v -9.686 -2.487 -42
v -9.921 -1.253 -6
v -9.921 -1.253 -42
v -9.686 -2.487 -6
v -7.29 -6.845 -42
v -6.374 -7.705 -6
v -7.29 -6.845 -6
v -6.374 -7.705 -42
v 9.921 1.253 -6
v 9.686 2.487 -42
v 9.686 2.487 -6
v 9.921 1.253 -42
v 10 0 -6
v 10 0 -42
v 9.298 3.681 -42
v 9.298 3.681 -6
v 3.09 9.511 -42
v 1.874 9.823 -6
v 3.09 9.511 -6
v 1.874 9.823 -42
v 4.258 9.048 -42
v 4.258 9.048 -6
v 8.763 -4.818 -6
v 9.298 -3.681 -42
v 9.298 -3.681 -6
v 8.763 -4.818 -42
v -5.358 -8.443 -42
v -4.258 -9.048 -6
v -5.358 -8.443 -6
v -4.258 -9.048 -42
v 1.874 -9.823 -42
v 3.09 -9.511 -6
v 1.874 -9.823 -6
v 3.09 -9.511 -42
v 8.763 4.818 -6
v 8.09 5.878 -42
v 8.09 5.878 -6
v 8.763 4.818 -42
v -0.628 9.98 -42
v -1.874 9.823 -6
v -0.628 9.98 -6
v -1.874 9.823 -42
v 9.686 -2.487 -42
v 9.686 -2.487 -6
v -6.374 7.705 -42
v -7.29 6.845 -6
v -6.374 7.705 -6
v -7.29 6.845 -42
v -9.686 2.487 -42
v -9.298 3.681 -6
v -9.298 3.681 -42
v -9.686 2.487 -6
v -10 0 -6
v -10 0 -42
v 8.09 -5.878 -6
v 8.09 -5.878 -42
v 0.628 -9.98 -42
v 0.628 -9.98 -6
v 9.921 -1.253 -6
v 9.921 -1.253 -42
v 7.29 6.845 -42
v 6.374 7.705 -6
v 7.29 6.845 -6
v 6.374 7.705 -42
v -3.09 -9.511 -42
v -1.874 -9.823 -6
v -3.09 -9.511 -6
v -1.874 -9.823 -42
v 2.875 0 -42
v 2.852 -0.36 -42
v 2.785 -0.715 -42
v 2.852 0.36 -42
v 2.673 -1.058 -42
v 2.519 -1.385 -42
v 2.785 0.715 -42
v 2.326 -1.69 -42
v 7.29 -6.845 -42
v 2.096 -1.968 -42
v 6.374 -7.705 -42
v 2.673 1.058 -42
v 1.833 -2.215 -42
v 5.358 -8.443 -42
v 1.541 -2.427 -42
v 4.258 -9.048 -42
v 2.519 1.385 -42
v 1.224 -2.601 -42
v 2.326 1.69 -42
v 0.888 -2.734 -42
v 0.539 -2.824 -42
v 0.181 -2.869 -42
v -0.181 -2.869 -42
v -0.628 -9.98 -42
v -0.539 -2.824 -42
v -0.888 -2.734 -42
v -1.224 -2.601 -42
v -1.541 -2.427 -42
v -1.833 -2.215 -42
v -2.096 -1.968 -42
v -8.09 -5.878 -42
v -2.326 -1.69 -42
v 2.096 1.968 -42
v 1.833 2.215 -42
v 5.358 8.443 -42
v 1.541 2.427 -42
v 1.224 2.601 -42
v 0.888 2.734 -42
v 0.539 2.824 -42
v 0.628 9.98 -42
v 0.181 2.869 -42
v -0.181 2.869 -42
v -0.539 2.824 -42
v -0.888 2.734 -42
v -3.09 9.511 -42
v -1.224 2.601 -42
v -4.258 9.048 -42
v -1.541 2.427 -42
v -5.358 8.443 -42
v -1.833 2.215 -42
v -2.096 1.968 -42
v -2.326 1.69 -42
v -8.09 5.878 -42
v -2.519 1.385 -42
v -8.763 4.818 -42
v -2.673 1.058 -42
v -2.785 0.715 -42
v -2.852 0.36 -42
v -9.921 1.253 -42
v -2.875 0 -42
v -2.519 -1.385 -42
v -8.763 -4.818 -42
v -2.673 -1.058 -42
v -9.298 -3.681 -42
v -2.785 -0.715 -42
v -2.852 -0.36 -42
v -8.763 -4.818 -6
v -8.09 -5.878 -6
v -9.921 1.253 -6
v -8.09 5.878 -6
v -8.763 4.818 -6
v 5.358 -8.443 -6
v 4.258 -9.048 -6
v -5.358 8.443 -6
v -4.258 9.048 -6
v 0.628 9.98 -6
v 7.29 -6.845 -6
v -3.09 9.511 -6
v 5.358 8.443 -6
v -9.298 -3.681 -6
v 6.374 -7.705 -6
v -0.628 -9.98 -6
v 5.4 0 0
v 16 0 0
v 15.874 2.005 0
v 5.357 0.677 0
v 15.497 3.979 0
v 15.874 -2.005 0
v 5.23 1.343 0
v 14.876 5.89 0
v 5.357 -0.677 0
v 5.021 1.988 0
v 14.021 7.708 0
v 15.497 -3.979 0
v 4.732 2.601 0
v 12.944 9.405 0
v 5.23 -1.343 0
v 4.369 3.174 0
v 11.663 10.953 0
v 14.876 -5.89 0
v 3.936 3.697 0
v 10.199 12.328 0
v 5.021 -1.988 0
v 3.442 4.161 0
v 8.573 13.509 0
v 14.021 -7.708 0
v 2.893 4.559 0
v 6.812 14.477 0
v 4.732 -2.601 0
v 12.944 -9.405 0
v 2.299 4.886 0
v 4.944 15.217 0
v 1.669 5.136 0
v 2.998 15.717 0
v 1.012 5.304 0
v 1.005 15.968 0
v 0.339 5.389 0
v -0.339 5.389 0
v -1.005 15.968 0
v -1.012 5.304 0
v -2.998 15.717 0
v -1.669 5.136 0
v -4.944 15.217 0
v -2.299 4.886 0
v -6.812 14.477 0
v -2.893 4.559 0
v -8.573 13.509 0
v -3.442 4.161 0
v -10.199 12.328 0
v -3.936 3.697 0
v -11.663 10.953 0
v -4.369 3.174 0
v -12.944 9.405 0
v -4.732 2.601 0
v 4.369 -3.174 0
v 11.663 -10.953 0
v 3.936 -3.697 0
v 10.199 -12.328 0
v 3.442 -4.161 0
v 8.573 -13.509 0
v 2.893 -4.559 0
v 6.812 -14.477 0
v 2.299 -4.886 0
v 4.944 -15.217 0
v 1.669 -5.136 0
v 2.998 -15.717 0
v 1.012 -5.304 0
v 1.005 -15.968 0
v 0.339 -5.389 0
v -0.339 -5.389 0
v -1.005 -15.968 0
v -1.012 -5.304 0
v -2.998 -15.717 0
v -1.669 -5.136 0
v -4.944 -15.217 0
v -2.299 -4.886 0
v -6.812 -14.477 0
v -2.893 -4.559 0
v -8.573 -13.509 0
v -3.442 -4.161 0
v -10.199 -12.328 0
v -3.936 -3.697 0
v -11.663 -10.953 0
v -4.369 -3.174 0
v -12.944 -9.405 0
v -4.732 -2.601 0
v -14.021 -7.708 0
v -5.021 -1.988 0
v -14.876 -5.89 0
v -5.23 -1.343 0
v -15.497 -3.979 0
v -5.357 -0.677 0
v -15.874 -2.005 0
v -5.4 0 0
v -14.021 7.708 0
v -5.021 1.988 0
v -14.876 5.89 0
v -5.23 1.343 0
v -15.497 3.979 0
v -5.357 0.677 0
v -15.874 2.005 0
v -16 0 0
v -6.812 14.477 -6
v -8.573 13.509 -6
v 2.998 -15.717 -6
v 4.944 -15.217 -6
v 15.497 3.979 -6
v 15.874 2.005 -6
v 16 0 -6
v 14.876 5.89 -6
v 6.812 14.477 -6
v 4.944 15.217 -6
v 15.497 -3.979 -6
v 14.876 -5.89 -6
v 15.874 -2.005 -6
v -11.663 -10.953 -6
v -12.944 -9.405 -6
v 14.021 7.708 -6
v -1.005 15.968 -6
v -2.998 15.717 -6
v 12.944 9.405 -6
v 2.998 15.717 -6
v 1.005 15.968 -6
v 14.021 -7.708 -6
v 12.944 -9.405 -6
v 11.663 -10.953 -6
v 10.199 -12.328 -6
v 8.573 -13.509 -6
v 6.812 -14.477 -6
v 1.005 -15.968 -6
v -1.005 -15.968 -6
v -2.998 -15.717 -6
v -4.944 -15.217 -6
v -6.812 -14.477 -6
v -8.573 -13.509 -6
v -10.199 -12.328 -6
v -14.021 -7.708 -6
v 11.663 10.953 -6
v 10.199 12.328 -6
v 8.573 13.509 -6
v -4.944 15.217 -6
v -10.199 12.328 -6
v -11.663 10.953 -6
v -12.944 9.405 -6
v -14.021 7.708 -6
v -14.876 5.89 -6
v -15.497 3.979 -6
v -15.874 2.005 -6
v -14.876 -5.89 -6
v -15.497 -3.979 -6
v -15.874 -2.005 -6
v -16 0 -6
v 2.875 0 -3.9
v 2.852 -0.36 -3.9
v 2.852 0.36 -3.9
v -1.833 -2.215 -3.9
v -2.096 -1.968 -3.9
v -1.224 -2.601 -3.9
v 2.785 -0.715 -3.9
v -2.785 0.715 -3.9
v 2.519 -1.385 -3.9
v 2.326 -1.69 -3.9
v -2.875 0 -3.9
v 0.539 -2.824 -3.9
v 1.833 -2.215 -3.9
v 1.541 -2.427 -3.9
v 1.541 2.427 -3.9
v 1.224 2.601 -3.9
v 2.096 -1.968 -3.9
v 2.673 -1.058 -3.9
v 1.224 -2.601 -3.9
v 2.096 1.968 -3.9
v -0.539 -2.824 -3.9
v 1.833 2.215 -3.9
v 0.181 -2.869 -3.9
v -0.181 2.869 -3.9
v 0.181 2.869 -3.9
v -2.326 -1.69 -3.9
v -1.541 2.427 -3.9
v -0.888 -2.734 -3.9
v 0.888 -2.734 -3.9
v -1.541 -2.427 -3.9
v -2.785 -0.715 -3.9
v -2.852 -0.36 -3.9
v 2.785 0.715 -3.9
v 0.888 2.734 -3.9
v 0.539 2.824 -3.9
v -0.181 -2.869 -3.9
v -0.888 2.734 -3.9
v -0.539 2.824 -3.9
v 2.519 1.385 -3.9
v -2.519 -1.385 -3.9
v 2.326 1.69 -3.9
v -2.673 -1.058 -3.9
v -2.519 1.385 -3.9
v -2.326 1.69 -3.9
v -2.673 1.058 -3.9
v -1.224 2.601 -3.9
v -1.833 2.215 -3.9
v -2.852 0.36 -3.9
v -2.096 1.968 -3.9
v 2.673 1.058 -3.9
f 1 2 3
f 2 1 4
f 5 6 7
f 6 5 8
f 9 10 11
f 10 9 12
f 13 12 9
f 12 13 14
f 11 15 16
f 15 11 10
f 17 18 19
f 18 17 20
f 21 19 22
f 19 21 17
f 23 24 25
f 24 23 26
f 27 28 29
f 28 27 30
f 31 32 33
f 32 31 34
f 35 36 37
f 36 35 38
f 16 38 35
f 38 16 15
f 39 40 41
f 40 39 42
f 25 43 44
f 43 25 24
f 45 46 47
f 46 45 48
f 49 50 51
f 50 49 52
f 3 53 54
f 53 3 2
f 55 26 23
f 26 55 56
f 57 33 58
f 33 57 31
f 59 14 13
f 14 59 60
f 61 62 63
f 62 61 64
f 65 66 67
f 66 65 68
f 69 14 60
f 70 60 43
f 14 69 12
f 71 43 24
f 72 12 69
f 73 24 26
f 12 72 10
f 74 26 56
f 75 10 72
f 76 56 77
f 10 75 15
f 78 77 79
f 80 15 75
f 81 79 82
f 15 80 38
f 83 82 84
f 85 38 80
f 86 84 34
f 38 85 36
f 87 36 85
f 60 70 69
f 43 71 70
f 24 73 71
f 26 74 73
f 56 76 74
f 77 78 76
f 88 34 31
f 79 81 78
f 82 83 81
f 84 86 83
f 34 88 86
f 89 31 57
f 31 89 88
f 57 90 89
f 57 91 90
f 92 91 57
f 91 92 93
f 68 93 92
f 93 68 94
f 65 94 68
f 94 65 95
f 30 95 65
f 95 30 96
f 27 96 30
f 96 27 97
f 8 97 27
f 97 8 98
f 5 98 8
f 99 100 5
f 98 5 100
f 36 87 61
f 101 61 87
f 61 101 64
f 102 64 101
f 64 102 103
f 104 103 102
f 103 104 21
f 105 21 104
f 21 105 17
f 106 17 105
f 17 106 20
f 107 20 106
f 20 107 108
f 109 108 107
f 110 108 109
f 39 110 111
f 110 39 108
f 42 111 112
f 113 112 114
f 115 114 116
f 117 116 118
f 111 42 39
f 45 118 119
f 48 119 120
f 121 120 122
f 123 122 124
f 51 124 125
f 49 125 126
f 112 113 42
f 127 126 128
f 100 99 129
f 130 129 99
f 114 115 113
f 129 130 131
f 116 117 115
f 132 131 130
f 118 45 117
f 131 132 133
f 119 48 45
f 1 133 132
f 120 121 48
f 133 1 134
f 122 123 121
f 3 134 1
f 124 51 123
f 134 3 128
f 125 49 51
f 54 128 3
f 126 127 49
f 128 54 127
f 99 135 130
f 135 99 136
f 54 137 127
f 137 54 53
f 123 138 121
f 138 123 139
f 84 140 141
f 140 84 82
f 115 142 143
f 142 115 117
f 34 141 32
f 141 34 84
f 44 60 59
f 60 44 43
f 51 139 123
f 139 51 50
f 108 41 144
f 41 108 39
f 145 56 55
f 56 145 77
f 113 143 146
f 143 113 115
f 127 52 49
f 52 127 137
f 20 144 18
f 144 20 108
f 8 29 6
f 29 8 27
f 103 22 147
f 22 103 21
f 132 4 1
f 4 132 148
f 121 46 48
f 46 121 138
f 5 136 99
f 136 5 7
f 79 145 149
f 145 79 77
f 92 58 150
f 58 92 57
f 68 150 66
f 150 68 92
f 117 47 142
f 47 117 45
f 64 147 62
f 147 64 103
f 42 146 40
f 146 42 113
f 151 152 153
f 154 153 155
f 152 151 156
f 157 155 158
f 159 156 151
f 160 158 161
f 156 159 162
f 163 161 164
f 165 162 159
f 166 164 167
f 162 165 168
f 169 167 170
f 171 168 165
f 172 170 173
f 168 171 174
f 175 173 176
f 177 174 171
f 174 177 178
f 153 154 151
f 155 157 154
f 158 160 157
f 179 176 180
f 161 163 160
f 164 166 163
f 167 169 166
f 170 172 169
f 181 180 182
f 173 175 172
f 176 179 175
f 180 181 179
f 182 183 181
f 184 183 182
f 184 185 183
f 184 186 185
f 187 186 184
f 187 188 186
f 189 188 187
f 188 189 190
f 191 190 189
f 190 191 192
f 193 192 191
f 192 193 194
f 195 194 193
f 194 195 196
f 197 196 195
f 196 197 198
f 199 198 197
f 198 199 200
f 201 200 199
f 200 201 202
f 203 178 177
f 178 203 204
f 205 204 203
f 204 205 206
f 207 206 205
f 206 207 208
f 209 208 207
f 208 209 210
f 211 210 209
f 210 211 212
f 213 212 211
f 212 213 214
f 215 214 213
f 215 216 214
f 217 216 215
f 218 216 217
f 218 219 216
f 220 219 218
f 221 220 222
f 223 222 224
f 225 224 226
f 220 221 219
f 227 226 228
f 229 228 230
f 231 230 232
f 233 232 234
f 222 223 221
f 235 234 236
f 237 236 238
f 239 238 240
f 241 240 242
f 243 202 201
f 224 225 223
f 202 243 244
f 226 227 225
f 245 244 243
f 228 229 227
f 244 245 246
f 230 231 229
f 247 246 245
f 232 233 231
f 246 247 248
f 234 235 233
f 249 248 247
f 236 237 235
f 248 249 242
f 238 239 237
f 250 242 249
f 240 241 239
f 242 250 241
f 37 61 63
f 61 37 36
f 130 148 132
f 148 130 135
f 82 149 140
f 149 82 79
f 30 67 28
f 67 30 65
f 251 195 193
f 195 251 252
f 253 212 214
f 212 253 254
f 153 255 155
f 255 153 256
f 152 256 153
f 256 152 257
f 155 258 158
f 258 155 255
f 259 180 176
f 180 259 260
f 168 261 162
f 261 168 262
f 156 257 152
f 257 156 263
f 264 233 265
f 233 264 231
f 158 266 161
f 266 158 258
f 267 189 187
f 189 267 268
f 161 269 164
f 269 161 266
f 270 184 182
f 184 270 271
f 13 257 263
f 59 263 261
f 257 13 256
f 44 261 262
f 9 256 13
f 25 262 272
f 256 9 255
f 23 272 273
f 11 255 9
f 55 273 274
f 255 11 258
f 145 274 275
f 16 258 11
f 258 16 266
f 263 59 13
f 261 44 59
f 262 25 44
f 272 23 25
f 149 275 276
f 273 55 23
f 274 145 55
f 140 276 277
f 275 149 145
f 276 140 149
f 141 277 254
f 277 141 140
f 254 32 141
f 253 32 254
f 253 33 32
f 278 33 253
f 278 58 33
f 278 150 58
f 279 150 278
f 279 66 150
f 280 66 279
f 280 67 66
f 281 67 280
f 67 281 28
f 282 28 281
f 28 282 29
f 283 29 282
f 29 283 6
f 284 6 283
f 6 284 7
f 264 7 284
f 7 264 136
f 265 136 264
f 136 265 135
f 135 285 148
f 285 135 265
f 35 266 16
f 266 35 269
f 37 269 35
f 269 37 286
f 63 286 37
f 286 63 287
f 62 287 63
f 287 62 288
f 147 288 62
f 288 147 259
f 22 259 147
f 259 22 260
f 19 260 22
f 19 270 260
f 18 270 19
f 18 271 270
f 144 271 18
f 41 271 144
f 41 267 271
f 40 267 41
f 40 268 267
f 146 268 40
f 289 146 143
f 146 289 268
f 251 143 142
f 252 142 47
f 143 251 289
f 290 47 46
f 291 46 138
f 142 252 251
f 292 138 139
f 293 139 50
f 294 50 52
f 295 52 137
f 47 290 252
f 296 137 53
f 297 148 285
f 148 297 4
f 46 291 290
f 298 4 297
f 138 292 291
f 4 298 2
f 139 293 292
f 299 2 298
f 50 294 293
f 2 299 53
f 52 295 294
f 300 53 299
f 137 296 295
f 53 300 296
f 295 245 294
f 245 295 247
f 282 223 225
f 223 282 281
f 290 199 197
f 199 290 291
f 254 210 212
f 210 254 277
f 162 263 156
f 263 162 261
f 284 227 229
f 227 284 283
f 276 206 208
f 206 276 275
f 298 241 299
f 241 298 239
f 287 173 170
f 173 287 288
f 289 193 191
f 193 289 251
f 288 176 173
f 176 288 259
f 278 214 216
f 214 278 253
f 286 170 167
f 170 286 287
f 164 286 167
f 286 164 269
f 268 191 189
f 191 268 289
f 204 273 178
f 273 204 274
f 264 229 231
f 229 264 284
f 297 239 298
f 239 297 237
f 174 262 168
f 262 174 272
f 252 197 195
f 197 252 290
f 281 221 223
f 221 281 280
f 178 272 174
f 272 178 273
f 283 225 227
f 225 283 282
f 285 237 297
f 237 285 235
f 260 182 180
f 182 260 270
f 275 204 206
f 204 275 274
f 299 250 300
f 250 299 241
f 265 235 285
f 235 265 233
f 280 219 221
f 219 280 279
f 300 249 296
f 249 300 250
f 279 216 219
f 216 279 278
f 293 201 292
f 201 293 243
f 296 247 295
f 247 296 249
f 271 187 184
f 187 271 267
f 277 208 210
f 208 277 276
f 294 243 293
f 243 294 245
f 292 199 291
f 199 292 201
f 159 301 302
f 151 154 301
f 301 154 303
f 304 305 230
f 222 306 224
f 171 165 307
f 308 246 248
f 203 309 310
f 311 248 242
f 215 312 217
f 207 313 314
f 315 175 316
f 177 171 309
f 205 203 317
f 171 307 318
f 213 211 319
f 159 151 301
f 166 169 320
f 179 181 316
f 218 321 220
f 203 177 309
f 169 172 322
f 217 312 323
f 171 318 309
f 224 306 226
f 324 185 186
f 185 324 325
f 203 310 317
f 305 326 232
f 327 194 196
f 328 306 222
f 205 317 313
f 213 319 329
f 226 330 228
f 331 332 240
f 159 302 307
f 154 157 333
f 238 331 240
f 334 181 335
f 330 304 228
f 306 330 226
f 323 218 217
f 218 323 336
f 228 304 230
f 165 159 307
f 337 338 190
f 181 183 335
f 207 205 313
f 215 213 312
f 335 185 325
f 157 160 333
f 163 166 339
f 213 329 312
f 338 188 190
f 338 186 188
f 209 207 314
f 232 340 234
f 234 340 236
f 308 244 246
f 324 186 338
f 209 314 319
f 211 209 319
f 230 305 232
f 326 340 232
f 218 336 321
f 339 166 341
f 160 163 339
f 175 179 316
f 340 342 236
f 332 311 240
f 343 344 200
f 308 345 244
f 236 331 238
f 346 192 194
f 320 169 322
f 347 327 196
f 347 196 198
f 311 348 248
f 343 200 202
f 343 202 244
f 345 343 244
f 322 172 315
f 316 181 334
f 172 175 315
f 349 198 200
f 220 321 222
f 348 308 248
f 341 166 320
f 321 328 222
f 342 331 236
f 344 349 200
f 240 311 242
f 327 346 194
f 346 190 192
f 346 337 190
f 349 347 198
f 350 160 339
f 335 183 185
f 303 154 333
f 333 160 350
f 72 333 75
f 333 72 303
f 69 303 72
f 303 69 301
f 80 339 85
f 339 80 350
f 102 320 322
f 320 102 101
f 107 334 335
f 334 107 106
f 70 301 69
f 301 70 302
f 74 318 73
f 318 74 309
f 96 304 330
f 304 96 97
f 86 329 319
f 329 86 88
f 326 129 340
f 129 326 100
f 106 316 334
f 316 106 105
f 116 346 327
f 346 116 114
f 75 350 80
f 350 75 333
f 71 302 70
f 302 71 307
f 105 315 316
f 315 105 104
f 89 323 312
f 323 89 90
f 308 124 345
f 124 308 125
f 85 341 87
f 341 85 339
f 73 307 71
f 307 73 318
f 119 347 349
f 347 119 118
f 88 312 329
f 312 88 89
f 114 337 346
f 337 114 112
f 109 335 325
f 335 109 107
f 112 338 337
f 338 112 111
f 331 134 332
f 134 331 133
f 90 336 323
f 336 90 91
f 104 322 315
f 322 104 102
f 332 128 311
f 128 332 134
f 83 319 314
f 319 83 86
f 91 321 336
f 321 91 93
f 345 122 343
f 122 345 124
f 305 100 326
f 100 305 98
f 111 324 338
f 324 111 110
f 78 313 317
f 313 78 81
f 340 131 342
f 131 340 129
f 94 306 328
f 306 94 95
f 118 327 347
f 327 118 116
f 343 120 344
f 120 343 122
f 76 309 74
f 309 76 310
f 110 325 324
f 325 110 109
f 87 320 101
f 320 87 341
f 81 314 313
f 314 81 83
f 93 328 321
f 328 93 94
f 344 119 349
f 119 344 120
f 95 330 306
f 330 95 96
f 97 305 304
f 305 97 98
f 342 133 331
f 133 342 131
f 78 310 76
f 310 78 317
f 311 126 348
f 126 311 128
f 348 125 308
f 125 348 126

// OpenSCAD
$fn = 50;


difference() {
	union() {
		translate(v = [0, 0, -42.0000000000]) {
			cylinder(h = 42, r = 10.0000000000);
		}
		translate(v = [0, 0, -6.0000000000]) {
			cylinder(h = 6, r = 16.0000000000);
		}
	}
	union() {
		translate(v = [0, 0, 0]) {
			rotate(a = [0, 0, 0]) {
				difference() {
					union() {
						#translate(v = [0, 0, -42.0000000000]) {
							cylinder(h = 42, r = 2.6000000000);
						}
						#translate(v = [0, 0, -3.9000000000]) {
							cylinder(h = 3.9000000000, r = 10.0000000000, r1 = 2.8750000000, r2 = 5.4000000000);
						}
						#translate(v = [0, 0, -42.0000000000]) {
							cylinder(h = 42, r = 2.8750000000);
						}
						#translate(v = [0, 0, -42.0000000000]) {
							cylinder(h = 42, r = 2.6000000000);
						}
					}
					union();
				}
			}
		}
	}
}
